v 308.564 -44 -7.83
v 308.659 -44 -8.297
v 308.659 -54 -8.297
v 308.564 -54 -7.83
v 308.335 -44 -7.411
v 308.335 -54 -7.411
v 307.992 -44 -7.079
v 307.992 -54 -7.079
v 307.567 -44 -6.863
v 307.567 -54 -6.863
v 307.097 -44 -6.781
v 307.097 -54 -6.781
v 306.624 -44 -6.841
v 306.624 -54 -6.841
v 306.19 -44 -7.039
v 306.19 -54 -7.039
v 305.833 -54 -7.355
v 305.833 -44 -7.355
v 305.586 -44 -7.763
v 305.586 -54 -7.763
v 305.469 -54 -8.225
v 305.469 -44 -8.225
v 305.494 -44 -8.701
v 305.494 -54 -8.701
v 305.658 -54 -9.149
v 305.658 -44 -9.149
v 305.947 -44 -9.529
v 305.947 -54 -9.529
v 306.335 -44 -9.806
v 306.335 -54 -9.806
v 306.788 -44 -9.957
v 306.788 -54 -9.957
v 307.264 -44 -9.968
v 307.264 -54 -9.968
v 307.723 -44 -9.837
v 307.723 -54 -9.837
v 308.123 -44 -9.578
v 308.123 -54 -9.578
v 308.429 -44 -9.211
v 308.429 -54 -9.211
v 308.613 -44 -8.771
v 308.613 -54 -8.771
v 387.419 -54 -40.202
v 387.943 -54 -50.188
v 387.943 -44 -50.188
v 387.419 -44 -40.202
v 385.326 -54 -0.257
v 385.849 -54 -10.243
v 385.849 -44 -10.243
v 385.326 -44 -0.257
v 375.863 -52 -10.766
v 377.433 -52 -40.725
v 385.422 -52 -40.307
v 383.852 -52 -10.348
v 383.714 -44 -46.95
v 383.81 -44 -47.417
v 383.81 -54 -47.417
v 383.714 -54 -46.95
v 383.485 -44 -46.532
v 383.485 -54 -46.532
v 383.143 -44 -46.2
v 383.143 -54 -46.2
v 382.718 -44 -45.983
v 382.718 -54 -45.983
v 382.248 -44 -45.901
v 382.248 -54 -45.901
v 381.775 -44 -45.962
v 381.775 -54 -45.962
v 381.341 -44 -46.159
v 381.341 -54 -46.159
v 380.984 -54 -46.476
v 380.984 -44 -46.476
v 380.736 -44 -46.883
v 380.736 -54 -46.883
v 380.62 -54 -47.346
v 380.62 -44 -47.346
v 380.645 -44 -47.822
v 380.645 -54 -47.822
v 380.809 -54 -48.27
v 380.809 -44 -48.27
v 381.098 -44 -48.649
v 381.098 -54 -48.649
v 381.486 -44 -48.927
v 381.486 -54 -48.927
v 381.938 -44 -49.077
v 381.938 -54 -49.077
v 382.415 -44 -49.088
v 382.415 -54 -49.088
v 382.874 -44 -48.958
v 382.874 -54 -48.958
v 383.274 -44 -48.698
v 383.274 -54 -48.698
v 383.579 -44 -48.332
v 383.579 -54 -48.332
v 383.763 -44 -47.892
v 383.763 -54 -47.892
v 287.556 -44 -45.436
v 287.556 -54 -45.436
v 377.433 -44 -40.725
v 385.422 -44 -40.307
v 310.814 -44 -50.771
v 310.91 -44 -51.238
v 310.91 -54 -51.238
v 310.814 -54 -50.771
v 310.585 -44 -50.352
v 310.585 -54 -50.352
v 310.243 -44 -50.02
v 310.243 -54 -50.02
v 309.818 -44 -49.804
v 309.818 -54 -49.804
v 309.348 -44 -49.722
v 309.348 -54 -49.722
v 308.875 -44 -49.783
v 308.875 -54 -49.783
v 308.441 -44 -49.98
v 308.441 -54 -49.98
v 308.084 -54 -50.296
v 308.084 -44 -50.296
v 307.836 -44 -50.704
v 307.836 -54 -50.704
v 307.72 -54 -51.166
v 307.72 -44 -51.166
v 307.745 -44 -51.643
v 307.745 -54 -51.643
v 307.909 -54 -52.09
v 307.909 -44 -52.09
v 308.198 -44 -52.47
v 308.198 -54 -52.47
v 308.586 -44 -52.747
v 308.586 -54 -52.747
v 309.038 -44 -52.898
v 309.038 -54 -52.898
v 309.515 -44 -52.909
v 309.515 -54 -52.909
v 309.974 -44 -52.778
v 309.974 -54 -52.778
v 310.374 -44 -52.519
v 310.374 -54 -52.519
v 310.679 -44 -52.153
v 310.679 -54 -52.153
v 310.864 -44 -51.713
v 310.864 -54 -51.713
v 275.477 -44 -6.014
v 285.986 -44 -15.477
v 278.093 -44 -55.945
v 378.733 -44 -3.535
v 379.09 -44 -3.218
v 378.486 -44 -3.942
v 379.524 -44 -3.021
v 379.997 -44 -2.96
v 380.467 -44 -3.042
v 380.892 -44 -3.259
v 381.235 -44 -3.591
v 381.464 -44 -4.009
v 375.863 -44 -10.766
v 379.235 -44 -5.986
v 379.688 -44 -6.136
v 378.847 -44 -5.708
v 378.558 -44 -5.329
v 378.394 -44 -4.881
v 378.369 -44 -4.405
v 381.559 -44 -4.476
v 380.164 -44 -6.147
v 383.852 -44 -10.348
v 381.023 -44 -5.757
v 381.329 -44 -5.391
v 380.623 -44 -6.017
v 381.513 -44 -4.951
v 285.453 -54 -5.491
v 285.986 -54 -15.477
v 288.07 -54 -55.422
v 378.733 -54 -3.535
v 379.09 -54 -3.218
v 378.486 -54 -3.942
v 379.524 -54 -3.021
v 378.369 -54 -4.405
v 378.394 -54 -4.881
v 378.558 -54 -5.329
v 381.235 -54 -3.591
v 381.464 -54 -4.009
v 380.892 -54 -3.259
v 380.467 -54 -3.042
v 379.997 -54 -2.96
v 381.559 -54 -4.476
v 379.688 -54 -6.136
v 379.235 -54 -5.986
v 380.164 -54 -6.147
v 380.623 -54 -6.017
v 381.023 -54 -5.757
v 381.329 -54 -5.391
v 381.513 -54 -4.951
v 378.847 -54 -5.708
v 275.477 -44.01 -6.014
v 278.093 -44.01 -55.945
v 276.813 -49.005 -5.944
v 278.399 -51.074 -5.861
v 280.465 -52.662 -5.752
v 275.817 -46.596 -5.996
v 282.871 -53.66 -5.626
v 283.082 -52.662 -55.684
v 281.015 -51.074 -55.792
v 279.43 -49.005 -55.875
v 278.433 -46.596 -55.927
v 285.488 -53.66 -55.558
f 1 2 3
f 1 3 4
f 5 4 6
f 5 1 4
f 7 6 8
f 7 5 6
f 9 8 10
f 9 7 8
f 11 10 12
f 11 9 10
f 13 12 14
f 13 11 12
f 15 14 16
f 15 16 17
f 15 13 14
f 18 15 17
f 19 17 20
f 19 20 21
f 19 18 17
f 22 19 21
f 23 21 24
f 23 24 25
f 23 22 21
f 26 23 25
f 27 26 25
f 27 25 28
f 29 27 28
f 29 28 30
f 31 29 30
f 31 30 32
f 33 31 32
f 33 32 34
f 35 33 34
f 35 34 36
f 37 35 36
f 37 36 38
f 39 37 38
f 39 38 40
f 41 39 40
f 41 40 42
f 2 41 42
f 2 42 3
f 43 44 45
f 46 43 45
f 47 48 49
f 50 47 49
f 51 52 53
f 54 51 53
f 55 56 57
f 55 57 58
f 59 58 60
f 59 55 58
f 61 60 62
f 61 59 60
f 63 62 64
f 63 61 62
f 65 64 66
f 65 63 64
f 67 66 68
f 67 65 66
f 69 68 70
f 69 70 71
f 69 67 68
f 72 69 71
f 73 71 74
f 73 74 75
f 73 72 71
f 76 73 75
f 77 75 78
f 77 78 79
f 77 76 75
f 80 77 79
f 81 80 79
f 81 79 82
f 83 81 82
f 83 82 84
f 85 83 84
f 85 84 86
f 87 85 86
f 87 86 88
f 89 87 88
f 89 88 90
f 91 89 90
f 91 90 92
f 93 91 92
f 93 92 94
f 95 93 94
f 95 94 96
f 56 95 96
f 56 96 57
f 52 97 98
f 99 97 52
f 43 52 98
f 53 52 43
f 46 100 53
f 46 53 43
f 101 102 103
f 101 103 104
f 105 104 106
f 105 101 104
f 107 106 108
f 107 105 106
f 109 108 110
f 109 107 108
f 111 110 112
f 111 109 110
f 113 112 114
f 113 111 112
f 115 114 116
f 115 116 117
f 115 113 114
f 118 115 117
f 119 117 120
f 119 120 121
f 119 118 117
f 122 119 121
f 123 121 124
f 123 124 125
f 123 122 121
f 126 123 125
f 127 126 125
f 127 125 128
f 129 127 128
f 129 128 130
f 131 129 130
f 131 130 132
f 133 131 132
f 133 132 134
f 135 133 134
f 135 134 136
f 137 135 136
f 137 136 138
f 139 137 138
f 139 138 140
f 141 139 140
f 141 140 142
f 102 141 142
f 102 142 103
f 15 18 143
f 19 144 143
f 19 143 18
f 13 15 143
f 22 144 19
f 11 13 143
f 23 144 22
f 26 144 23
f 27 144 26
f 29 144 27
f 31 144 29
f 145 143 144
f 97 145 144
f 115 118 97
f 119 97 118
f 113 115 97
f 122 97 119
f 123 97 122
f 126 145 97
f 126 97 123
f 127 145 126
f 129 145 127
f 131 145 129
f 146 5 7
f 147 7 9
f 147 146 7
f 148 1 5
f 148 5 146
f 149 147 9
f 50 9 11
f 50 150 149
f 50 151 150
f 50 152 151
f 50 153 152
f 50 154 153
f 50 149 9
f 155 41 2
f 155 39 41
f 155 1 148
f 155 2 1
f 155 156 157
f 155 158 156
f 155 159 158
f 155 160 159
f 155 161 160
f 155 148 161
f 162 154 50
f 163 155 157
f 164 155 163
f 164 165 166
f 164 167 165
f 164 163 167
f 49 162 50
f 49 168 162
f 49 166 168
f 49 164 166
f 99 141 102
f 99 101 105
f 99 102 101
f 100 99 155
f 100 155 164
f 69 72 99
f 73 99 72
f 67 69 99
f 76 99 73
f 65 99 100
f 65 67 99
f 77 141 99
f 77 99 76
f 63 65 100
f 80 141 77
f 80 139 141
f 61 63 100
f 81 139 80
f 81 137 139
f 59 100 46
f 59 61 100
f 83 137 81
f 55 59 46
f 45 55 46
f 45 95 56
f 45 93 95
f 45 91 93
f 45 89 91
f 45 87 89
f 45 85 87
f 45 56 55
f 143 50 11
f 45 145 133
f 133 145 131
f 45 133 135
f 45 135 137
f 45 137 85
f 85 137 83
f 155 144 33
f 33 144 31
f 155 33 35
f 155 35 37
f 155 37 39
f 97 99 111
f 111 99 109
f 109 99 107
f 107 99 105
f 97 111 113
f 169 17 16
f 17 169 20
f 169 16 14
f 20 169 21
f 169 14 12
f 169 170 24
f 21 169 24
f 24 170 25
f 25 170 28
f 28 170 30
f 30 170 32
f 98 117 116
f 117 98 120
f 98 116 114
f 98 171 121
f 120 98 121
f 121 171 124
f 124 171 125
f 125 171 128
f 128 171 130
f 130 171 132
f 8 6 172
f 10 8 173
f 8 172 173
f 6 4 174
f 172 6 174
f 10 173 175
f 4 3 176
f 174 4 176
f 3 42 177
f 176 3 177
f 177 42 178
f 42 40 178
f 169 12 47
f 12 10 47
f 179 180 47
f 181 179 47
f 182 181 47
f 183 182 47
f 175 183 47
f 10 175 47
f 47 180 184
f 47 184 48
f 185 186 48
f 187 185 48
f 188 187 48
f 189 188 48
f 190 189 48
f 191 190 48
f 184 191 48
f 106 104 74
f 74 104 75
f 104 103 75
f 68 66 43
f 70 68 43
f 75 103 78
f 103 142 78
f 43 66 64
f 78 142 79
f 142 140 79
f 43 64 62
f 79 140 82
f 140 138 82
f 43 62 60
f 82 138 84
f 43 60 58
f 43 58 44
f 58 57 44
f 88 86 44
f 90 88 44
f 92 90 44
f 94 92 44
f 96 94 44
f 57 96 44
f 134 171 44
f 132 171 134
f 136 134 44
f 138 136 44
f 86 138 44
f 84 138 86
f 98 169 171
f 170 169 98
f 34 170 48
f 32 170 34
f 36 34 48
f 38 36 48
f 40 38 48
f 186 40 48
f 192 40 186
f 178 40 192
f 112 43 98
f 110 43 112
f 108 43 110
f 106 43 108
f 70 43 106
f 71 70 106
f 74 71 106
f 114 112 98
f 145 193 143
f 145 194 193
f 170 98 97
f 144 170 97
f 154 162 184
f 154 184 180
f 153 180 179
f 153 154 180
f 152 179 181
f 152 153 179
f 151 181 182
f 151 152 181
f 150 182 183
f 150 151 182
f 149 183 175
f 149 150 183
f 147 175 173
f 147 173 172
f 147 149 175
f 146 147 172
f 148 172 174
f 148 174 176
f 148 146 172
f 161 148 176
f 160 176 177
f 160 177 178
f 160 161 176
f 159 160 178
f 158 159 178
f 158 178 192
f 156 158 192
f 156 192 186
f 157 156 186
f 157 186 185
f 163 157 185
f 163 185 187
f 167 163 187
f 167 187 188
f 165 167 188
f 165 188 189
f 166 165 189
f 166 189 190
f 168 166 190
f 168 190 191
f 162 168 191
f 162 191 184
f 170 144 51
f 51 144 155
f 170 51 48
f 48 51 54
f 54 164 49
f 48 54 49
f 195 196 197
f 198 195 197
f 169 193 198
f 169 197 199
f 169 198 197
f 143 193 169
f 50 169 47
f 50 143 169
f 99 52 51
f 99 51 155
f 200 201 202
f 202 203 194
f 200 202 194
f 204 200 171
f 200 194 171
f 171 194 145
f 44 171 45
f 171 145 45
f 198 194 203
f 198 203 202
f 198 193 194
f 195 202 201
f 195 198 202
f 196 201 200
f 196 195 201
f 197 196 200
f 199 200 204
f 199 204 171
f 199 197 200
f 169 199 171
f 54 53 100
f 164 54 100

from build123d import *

# Parameters (mm, degrees)
CYLINDER127_R             = 1.6
CYLINDER127_DEPTH         = 25
CYLINDER126_R             = 1.6
CYLINDER126_DEPTH         = 25
CYLINDER128_R             = 1.6
CYLINDER128_DEPTH         = 25
CYLINDER129_R             = 1.6
CYLINDER129_DEPTH         = 25
FUSION106_PLACEMENT_ANGLE = 3
BOX058_W                  = 8
BOX058_H                  = 8
BOX058_DEPTH              = 50
BOX057_W                  = 110
BOX057_H                  = 10
BOX057_DEPTH              = 10
BOX059_W                  = 10
BOX059_H                  = 10
BOX059_DEPTH              = 50
BOX056_W                  = 110
BOX056_H                  = 10
BOX056_DEPTH              = 10
FILLET026_R               = 9.99
FILLET026_PLACEMENT_ANGLE = 3


with BuildPart() as cylinder127:
    # Cylinder127 → Cylinder127 (new body)
    with BuildSketch(Plane(origin=(76.5, 96, 46.5), x_dir=(1, 0, 0), z_dir=(0, -1, 0))):
        Circle(CYLINDER127_R)
    extrude(amount=CYLINDER127_DEPTH)


with BuildPart() as cylinder126:
    # Cylinder126 → Cylinder126 (new body)
    with BuildSketch(Plane(origin=(76.5, 96, 3.5), x_dir=(1, 0, 0), z_dir=(0, -1, 0))):
        Circle(CYLINDER126_R)
    extrude(amount=CYLINDER126_DEPTH)


with BuildPart() as cylinder128:
    # Cylinder128 → Cylinder128 (new body)
    with BuildSketch(Plane(origin=(3.5, 96, 46.5), x_dir=(1, 0, 0), z_dir=(0, -1, 0))):
        Circle(CYLINDER128_R)
    extrude(amount=CYLINDER128_DEPTH)


with BuildPart() as fusion106:
    # Cylinder129 → Cylinder129 (new body)
    with BuildSketch(Plane(origin=(3.5, 96, 3.5), x_dir=(1, 0, 0), z_dir=(0, -1, 0))):
        Circle(CYLINDER129_R)
    extrude(amount=CYLINDER129_DEPTH)

    # Fusion106: union Cylinder127, Cylinder126, Cylinder128
    add(cylinder127.part)
    add(cylinder126.part)
    add(cylinder128.part)


with BuildPart() as fusion106_1:
    # Fusion106 placement: moved
    add(fusion106.part.moved(Location((306, -120, -55))).rotate(Axis((306, -120, -55), (0, -1, 0)), FUSION106_PLACEMENT_ANGLE))


with BuildPart() as cube037:
    # Box058 → Box058 (new body)
    with BuildSketch(Plane(origin=(100, 2, -40), x_dir=(1, 0, 0), z_dir=(0, 0, 1))):
        with Locations((4, 4)):
            Rectangle(BOX058_W, BOX058_H)
    extrude(amount=BOX058_DEPTH)


with BuildPart() as cube036:
    # Box057 → Box057 (new body)
    with BuildSketch(Plane.XY.offset(-40)):
        with Locations((55, 5)):
            Rectangle(BOX057_W, BOX057_H)
    extrude(amount=BOX057_DEPTH)


with BuildPart() as cube038:
    # Box059 → Box059 (new body)
    with BuildSketch(Plane.XY.offset(-40)):
        with Locations((5, 5)):
            Rectangle(BOX059_W, BOX059_H)
    extrude(amount=BOX059_DEPTH)


with BuildPart() as cut067:
    # Box056 → Box056 (new body)
    with BuildSketch(Plane.XY):
        with Locations((55, 5)):
            Rectangle(BOX056_W, BOX056_H)
    extrude(amount=BOX056_DEPTH)

    # Fusion100: union Cube037, Cube036, Cube038
    add(cube037.part)
    add(cube036.part)
    add(cube038.part)

    # Fillet026
    fillet026_edges = [cut067.edges().sort_by_distance(p)[0] for p in [
        (0, 0, -15),
    ]]
    fillet(fillet026_edges, radius=FILLET026_R)


with BuildPart() as cut067_1:
    # Fillet026 placement: moved
    add(cut067.part.moved(Location((276, -49, -16))).rotate(Axis((276, -49, -16), (0, -1, 0)), FILLET026_PLACEMENT_ANGLE))

    # Cut067: cut Fusion106
    add(fusion106_1.part, mode=Mode.SUBTRACT)


with BuildPart() as cut067_2:
    # Cut067 placement: moved
    add(cut067_1.part.moved(Location((0, -5, 0))))


solid = cut067_2.part
